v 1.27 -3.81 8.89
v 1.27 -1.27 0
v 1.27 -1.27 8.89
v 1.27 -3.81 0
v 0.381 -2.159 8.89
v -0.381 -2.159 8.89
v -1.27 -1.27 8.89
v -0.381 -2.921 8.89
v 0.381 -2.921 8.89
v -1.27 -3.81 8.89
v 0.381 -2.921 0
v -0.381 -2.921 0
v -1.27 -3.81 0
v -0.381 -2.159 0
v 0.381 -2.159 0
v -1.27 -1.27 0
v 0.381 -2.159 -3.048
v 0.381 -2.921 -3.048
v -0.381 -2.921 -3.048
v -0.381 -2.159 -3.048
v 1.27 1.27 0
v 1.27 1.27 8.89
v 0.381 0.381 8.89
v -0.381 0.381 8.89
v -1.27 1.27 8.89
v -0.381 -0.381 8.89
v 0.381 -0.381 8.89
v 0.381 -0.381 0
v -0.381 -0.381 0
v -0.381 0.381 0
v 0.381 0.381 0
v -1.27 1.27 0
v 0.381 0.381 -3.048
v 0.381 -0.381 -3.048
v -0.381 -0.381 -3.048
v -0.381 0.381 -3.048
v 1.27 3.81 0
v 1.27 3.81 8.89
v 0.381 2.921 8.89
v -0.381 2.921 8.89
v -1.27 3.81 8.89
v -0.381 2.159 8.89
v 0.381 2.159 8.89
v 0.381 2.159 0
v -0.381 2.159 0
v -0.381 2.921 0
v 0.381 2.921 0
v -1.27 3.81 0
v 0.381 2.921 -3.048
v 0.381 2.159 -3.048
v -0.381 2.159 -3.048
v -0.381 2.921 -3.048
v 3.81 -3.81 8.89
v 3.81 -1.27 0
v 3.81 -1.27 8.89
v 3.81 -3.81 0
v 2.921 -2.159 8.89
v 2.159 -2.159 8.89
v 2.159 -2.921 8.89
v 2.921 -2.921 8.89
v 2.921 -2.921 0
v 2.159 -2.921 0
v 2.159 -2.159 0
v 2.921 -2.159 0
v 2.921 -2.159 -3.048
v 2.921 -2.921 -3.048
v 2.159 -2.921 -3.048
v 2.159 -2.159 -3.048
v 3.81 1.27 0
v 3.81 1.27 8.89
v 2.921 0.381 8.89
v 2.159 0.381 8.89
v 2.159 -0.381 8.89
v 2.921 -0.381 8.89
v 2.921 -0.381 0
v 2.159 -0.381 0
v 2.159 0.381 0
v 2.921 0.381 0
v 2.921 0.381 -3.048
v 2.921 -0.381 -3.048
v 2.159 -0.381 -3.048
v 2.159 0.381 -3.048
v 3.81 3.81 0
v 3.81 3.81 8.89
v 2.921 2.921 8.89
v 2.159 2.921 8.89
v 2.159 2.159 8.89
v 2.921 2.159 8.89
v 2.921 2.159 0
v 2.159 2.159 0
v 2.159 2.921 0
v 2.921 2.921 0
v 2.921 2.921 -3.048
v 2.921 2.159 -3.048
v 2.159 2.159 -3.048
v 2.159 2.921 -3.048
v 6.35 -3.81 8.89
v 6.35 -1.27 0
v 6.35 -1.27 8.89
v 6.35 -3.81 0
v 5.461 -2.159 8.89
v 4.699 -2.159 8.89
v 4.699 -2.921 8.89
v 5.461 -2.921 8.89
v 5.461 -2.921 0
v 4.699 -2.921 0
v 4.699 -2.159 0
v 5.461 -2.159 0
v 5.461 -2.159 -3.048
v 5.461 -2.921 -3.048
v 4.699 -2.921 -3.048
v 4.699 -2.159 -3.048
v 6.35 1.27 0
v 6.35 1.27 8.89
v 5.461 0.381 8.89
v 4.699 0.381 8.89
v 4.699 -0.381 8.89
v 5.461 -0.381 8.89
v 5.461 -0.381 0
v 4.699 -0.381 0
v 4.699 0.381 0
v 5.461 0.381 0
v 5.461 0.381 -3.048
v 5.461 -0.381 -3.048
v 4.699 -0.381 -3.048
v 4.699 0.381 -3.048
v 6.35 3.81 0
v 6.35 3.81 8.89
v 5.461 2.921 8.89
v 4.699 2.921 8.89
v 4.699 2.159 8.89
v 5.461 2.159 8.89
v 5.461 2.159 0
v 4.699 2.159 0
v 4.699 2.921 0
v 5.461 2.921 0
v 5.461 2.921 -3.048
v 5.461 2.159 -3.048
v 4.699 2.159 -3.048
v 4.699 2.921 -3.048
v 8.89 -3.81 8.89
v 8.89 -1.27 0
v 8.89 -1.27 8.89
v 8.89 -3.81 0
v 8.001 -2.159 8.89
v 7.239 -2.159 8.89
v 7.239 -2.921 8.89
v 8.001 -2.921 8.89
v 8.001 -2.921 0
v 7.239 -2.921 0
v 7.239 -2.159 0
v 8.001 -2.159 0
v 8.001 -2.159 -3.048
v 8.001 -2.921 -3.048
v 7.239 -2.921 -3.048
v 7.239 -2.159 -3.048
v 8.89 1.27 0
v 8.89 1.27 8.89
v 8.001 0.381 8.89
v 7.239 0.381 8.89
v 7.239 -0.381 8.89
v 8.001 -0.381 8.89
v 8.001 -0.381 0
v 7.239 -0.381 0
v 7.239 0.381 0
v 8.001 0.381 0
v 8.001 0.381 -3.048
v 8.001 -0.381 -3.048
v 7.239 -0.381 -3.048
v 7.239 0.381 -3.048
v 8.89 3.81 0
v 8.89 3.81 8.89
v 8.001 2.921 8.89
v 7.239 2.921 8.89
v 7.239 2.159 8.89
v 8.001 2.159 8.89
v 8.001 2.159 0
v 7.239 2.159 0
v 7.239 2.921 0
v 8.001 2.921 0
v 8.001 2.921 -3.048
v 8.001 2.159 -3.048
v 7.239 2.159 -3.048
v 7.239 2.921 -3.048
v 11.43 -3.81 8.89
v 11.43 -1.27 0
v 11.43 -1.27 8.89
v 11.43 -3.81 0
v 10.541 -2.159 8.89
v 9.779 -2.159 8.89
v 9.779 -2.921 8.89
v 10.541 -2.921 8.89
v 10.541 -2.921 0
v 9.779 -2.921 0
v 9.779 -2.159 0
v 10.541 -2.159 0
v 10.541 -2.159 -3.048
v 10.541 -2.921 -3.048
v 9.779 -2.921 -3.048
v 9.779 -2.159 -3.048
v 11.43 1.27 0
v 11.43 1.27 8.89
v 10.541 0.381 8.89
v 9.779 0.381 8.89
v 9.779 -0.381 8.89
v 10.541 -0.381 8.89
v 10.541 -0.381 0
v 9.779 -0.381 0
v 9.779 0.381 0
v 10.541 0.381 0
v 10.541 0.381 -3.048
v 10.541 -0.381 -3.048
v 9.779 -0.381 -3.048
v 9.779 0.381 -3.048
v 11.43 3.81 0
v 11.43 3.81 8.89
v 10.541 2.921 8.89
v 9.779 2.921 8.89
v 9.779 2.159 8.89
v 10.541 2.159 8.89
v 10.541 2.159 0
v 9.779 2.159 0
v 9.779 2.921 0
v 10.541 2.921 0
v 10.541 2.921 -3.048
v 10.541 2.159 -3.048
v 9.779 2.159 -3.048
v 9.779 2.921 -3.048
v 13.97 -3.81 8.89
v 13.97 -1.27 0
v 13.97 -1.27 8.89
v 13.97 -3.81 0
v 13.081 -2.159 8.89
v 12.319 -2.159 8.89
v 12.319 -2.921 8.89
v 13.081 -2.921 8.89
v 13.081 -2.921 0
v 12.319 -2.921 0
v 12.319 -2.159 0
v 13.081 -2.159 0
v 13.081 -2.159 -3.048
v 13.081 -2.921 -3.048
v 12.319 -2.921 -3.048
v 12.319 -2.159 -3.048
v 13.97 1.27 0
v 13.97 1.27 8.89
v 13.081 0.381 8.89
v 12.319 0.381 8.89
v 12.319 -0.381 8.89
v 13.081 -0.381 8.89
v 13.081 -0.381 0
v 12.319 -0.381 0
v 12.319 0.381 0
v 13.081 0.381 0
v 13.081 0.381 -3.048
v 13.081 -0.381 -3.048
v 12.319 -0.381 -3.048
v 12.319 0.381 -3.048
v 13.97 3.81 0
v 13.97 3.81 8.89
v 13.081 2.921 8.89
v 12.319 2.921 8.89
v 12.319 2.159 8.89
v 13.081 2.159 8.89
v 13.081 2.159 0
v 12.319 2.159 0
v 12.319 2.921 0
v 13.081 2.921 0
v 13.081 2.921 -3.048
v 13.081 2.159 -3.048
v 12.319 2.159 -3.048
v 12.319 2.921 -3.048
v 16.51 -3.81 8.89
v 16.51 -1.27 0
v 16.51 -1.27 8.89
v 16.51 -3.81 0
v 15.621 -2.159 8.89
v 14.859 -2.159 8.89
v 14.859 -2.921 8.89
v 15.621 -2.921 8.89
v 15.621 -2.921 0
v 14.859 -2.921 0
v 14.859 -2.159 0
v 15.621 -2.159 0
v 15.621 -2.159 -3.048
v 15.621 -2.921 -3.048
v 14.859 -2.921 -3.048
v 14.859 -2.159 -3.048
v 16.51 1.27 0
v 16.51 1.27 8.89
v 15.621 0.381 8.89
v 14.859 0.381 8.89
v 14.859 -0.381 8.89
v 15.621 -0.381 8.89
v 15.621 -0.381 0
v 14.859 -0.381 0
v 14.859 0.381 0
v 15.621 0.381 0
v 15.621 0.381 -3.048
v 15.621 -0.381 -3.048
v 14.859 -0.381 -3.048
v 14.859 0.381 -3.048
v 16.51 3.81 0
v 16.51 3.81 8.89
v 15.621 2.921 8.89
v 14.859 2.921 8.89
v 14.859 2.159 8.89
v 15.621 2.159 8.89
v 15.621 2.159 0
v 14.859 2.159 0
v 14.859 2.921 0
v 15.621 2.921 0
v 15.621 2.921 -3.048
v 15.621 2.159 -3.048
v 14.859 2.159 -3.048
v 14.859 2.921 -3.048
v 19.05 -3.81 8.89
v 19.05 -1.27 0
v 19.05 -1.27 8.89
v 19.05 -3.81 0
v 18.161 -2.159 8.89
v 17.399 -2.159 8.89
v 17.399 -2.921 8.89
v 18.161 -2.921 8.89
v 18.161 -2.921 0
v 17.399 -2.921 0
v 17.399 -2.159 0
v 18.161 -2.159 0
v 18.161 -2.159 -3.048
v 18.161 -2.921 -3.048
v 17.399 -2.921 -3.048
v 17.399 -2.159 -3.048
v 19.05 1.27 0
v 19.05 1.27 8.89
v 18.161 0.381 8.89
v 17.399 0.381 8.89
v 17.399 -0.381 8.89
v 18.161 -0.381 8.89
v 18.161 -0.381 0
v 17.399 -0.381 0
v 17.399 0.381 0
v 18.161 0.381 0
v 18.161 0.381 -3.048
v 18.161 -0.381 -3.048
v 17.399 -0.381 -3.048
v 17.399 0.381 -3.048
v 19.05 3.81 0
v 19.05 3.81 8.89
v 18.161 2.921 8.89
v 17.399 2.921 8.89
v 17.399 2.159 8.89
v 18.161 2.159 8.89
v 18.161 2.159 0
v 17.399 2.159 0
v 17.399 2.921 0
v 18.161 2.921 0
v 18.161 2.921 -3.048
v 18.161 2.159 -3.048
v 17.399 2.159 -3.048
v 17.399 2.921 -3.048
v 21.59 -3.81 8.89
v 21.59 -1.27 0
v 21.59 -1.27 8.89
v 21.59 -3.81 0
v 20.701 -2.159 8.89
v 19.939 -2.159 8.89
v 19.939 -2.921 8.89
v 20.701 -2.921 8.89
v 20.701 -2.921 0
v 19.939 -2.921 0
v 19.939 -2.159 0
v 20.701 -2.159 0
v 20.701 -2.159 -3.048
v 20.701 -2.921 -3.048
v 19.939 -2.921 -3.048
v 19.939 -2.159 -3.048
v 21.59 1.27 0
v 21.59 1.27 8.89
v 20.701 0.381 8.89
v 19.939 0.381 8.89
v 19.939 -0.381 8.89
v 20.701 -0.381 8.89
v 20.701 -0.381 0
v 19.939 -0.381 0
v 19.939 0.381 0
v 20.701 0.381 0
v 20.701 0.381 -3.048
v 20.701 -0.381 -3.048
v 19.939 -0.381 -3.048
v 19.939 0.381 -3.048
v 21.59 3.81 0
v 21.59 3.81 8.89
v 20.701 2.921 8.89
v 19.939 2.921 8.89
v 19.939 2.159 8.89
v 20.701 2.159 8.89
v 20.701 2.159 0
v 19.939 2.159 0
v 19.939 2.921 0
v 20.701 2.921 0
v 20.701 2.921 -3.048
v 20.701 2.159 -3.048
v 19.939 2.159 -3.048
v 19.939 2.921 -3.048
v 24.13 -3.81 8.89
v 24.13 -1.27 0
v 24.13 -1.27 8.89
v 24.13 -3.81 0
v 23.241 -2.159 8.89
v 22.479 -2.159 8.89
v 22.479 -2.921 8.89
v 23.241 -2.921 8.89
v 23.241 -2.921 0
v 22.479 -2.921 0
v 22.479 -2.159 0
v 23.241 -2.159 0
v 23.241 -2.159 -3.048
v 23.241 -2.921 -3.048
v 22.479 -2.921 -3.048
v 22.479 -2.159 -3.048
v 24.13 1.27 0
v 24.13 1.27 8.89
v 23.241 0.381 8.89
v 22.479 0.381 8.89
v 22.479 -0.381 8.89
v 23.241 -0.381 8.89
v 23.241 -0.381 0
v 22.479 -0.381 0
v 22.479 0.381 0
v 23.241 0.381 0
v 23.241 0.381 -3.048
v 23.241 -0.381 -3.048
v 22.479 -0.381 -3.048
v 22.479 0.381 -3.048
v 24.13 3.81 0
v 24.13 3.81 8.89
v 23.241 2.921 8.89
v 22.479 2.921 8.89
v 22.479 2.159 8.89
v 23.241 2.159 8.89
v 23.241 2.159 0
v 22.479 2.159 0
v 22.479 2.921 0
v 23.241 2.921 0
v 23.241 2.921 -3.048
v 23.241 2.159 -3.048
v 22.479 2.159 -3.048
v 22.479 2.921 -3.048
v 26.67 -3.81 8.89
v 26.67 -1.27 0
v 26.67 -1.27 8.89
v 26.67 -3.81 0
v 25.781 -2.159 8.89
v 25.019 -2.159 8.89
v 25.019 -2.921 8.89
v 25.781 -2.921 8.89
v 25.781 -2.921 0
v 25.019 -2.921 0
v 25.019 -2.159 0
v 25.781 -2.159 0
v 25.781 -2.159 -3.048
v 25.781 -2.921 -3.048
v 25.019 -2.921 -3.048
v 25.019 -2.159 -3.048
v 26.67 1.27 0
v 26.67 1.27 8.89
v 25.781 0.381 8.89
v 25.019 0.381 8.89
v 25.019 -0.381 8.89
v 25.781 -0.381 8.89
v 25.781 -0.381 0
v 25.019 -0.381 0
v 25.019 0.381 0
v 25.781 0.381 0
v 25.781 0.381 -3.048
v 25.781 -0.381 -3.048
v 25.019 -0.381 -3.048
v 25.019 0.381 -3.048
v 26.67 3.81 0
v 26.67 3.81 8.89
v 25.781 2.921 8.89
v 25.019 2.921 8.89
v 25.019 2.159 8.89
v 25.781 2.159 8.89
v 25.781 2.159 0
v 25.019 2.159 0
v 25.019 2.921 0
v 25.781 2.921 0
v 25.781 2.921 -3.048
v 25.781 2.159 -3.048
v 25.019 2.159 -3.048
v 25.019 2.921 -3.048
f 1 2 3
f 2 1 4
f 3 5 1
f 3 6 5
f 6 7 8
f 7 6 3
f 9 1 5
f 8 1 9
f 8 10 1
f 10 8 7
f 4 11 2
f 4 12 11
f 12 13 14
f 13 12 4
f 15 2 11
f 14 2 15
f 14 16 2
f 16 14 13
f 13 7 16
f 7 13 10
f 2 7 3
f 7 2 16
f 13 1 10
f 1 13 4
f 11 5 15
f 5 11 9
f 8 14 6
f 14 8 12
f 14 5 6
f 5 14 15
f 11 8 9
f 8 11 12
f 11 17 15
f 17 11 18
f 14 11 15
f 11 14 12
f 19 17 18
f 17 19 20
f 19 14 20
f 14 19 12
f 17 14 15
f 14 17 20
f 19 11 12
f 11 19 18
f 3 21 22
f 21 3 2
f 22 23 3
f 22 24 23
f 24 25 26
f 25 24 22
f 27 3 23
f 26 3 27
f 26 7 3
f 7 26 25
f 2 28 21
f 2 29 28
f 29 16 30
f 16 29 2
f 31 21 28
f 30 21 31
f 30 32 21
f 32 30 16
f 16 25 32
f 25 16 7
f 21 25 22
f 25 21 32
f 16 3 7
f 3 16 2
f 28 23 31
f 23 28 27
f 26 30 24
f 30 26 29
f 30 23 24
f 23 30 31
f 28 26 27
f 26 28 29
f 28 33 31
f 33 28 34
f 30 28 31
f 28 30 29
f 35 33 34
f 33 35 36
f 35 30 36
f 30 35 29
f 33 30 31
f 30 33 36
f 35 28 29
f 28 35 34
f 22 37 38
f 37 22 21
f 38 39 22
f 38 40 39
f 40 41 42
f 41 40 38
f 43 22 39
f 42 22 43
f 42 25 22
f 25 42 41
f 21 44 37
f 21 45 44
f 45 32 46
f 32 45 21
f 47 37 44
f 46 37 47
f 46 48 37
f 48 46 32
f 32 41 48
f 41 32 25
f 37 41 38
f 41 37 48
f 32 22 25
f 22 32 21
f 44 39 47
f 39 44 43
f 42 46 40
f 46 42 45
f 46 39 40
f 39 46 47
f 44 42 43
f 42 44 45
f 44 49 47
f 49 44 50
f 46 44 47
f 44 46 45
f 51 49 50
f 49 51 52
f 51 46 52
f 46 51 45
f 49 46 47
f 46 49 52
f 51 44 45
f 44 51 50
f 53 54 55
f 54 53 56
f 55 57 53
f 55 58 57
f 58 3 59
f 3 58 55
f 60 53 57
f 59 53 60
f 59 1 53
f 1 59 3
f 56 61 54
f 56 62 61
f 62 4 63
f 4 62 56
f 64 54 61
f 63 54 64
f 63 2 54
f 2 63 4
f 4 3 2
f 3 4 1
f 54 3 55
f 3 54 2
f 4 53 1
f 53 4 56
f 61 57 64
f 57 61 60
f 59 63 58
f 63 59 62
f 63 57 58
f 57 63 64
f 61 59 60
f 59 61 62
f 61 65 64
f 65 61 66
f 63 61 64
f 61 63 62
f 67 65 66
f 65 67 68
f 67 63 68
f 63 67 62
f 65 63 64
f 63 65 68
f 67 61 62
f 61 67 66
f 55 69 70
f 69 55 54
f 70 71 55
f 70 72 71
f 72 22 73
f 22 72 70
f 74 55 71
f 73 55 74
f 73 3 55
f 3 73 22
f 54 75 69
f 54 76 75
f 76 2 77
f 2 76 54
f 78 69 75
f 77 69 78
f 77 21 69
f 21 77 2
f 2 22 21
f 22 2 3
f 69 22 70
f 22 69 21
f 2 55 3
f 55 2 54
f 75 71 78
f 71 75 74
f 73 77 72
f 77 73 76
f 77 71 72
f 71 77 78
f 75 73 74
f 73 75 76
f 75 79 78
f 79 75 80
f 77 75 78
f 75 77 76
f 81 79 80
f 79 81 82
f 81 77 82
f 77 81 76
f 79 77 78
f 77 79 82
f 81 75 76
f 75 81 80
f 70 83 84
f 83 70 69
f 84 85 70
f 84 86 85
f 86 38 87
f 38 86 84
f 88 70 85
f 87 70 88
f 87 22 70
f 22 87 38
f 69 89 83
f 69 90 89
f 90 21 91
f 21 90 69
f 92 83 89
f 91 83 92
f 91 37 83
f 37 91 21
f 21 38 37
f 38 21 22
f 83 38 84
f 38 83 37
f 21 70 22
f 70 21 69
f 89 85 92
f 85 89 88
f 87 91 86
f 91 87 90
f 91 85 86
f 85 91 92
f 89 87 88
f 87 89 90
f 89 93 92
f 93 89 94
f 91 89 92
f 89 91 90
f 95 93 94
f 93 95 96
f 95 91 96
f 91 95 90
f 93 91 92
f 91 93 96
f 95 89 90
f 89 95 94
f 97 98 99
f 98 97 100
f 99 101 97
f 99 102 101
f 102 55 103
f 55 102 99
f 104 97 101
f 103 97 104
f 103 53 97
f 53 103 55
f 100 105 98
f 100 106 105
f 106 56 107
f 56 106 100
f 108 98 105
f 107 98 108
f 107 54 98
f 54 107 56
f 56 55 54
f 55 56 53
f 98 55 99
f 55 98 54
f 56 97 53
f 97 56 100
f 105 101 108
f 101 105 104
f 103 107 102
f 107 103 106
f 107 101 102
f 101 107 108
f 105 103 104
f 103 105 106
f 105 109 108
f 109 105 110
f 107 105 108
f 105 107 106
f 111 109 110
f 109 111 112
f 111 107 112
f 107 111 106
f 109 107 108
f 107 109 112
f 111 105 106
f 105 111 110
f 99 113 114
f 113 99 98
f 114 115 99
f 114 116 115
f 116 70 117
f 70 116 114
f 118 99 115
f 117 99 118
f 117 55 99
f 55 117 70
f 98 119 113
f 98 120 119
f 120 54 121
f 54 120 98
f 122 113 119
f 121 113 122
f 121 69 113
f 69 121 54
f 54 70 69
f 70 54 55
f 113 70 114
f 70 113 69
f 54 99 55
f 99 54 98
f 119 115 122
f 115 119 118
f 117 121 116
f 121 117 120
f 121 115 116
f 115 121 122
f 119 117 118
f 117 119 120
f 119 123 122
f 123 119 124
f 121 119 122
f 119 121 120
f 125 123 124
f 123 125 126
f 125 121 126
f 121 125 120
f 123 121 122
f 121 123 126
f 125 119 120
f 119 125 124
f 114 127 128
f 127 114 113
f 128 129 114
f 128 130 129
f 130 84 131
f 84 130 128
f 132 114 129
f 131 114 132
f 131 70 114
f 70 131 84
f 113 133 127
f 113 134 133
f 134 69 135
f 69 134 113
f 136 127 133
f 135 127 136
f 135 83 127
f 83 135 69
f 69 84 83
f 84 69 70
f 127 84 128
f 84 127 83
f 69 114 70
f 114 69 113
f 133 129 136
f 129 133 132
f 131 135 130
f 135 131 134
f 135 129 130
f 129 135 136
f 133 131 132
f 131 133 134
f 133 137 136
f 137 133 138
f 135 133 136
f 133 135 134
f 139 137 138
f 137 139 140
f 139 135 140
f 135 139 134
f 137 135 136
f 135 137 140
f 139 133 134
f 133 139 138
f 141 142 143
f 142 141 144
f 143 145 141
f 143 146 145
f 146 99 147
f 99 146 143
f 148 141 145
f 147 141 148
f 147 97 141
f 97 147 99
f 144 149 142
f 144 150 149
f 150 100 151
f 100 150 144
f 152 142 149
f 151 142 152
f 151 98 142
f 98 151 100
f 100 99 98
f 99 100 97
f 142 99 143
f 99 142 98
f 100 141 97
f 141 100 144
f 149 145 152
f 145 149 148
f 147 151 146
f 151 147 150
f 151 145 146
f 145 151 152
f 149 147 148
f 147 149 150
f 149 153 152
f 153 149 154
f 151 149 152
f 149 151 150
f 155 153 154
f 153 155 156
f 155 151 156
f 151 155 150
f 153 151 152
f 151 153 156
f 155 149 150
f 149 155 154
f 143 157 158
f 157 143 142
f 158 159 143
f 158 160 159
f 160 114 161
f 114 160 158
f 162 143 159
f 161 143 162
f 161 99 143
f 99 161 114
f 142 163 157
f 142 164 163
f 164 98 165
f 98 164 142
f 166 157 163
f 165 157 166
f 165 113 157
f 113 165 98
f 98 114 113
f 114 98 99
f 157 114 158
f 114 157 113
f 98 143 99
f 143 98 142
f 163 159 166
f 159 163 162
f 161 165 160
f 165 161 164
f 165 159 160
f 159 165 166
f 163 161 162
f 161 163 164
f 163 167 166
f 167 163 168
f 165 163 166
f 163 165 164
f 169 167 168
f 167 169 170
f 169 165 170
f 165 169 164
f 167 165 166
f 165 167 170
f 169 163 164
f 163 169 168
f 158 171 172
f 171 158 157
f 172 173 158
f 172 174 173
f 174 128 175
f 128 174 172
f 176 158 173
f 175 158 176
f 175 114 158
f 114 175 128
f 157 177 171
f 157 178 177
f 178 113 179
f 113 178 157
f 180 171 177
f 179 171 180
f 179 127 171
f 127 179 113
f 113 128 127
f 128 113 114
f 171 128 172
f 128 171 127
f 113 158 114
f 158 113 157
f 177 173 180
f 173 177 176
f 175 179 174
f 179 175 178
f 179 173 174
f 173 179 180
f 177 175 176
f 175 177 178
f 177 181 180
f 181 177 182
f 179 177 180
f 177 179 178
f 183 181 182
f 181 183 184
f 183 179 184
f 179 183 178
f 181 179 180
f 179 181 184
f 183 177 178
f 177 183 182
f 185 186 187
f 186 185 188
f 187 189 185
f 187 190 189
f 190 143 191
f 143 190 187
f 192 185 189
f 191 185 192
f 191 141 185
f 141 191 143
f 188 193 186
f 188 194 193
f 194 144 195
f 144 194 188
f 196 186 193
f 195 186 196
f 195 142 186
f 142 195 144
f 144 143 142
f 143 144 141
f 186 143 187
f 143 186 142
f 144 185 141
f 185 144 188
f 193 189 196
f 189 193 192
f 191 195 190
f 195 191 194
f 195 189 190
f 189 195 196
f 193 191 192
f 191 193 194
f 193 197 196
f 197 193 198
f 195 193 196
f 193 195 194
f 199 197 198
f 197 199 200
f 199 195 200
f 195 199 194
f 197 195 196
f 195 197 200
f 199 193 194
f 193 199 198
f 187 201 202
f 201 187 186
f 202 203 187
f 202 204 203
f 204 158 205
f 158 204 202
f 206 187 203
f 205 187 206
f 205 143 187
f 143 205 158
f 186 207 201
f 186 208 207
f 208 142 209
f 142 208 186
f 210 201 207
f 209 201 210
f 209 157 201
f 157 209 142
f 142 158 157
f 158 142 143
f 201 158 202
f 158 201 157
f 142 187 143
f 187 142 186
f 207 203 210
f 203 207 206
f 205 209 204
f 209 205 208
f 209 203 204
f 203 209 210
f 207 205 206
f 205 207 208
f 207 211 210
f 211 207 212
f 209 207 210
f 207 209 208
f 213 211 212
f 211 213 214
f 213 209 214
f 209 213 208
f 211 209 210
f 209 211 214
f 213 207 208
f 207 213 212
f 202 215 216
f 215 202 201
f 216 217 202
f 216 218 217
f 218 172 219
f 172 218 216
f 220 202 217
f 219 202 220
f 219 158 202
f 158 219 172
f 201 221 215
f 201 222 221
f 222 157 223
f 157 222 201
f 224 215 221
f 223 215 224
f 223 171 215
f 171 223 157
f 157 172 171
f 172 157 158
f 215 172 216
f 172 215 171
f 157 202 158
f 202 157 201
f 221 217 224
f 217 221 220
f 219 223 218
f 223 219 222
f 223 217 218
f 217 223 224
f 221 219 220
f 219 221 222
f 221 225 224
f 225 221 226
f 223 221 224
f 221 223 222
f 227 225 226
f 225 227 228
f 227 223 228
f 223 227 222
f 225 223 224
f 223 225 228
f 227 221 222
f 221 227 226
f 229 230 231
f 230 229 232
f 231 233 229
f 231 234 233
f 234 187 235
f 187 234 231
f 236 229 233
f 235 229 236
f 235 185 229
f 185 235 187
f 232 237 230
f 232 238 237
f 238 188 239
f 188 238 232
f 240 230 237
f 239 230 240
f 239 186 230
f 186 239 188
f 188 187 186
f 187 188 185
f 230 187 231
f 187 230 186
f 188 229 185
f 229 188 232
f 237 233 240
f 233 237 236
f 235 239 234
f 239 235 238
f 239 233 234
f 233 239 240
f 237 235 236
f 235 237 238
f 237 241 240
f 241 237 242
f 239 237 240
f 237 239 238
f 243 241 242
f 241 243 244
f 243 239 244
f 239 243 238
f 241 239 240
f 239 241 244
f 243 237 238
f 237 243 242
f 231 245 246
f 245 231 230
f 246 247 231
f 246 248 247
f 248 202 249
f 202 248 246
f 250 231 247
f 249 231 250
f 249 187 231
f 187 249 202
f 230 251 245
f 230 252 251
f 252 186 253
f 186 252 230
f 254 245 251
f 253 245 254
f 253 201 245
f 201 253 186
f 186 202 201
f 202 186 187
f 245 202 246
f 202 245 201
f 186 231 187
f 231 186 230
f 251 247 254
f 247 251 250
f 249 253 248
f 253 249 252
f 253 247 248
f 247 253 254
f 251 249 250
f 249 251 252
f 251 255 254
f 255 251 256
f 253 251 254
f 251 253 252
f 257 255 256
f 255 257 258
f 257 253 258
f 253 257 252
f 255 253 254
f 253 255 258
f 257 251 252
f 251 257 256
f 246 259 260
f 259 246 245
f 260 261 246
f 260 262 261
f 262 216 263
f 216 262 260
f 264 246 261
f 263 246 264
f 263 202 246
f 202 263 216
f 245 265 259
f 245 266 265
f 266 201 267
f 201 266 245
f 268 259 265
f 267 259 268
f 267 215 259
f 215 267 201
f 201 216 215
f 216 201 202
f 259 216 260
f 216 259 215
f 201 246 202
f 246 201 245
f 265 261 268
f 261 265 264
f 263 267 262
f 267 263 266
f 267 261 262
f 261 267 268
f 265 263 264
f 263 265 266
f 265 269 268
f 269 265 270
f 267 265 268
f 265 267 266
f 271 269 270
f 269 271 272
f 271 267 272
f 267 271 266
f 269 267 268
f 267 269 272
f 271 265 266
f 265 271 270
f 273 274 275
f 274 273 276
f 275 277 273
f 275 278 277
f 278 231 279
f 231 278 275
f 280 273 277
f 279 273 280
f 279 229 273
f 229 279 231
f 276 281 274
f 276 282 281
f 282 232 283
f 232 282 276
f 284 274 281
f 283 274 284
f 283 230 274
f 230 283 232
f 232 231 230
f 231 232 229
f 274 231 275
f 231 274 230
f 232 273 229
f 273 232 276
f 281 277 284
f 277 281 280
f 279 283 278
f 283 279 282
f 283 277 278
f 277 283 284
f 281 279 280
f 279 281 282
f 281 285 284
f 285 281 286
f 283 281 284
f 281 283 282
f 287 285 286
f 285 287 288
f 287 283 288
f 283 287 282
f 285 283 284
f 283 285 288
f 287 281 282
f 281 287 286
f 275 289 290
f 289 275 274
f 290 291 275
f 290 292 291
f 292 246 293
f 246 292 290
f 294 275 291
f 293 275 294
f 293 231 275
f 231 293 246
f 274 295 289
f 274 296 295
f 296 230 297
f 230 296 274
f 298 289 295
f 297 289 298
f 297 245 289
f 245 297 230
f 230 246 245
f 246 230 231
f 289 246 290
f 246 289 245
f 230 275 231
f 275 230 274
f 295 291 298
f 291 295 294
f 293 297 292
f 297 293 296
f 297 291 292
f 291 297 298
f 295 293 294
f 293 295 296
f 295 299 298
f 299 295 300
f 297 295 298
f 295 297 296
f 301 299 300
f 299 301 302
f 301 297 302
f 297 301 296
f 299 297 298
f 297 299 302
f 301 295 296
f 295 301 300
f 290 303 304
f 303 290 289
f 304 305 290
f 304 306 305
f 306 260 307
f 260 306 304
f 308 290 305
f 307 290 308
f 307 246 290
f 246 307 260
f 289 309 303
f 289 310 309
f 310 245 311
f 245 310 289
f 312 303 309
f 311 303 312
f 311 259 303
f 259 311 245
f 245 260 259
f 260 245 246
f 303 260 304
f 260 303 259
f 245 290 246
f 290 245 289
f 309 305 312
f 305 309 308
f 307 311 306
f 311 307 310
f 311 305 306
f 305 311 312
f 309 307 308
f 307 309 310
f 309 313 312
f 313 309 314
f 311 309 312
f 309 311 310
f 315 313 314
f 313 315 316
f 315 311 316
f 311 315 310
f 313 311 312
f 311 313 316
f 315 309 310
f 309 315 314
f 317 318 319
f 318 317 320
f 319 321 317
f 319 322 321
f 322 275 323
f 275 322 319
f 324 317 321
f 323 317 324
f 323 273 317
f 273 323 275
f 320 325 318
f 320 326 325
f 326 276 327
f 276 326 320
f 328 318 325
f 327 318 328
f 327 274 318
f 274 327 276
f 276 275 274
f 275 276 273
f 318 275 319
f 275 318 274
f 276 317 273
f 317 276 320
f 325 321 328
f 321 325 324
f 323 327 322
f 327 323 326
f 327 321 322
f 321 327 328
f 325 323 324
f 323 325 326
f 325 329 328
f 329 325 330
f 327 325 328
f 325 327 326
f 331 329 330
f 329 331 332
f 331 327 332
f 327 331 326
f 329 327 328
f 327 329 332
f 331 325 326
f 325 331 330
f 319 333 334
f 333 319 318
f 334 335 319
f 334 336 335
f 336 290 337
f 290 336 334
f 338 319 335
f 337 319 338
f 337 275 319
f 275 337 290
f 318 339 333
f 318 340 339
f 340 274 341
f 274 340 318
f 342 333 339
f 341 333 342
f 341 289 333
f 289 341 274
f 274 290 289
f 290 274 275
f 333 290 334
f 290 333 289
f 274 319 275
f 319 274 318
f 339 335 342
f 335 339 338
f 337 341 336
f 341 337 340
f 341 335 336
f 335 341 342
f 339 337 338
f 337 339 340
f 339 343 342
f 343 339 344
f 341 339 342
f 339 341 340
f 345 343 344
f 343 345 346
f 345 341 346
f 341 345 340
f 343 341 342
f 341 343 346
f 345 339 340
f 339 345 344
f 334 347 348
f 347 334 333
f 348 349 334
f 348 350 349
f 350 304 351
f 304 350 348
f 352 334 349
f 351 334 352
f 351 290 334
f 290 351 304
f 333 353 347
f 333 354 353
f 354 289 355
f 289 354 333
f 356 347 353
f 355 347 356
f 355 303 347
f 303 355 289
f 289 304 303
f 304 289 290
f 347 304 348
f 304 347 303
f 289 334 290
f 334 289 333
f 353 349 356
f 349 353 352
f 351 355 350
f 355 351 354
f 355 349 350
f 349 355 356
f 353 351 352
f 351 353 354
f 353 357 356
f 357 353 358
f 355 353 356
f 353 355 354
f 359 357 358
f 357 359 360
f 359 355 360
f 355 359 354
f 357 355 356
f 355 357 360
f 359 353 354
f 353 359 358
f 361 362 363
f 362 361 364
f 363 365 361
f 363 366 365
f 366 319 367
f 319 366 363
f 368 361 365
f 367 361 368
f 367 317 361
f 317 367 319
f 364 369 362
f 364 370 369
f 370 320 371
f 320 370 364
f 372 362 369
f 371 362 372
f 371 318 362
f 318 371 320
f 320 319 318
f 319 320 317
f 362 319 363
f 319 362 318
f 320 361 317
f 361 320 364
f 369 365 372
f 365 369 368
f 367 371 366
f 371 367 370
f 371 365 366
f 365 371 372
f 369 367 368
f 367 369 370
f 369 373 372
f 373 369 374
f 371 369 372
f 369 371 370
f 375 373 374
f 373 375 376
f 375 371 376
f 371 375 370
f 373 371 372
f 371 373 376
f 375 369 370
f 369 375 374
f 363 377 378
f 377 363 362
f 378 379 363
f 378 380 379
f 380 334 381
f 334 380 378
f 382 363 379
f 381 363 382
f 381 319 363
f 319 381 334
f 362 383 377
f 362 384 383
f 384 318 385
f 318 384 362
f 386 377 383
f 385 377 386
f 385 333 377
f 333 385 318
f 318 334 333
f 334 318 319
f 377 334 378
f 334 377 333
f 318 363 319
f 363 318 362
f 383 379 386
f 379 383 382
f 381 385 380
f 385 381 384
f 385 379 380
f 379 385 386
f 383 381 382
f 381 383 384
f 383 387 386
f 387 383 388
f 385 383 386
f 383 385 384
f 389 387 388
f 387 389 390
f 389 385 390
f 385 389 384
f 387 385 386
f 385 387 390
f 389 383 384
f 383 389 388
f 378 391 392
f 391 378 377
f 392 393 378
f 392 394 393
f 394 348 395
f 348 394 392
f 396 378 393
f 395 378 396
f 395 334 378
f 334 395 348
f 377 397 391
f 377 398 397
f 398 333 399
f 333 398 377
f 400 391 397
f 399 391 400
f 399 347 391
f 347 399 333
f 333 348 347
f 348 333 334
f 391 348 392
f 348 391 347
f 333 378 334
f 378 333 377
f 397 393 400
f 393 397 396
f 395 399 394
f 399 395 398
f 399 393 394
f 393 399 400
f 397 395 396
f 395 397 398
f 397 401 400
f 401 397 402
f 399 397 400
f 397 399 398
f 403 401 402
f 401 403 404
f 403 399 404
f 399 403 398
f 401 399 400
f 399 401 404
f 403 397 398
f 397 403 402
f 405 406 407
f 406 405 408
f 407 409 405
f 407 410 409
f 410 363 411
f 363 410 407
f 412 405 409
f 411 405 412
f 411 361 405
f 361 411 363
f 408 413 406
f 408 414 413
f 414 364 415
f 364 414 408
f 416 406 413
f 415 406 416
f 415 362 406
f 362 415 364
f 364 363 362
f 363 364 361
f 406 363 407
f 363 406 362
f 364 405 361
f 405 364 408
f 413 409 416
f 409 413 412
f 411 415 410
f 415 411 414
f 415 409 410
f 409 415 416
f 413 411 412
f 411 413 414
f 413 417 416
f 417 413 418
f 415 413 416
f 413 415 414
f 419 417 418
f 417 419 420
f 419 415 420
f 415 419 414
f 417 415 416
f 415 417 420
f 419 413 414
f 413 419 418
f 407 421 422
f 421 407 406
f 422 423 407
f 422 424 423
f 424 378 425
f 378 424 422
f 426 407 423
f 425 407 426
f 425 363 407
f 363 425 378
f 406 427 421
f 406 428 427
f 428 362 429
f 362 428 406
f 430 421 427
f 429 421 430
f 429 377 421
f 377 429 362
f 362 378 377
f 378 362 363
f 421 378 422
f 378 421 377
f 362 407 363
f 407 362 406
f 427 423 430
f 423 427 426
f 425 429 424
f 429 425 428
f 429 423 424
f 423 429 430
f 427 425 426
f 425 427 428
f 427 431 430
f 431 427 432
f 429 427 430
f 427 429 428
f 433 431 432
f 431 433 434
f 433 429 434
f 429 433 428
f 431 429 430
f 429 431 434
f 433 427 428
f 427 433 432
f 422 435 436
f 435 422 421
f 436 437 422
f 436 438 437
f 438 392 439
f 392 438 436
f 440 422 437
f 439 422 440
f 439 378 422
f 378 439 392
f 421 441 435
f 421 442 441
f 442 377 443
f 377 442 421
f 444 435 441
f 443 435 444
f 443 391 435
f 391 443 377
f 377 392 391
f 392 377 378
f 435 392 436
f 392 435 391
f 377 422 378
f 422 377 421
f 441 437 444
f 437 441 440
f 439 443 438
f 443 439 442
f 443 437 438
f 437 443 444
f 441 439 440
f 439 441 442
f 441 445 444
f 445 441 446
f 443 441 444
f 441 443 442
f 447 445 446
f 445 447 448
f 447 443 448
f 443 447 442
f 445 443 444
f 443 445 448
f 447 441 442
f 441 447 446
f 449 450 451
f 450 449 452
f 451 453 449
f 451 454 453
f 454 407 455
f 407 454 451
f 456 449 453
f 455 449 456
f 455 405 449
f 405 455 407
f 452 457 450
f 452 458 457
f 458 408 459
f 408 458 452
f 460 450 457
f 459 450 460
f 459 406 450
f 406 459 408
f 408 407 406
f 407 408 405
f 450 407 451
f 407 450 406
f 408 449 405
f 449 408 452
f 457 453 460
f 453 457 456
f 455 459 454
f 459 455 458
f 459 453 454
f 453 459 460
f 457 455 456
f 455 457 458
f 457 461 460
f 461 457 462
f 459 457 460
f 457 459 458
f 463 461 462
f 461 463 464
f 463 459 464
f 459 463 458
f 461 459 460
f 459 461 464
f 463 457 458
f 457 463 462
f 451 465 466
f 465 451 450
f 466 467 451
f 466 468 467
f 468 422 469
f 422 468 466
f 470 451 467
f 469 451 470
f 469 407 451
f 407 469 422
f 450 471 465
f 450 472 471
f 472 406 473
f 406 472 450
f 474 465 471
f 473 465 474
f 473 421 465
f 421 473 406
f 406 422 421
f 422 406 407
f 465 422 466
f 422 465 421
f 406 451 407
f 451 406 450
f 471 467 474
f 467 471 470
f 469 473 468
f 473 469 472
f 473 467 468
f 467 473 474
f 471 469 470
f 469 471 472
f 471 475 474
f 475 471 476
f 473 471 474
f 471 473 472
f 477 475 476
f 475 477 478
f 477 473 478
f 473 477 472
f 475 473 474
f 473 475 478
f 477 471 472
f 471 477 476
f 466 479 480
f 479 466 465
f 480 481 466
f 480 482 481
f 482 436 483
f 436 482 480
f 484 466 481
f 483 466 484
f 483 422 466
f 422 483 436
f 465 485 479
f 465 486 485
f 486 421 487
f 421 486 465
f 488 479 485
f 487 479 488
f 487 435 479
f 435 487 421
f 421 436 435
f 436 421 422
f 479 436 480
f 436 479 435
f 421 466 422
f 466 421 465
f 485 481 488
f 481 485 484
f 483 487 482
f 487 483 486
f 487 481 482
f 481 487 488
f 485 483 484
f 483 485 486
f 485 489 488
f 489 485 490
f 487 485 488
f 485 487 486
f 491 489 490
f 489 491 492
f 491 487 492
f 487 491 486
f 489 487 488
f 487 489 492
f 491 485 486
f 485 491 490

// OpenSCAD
module pinF(){
    millis= 0.0254;
    pin=    30*millis;
    pinH=   450*millis;
    space=  100*millis;
    cut=    10*millis;
    mXY=[   [0,0,0], 
            [0,1,0],
            [1,0,0],
            [1,1,0]]; //mirror XY
    
    color("gold")
    translate ([-pin/2,-pin/2,-120*millis]) cube([pin,pin,120*millis]);    
    color("gray") 
    difference(){
        translate(-[space,space]/2) cube([space,space,pinH-space]);
//        for (i=mXY) mirror(i) translate([space,space]/2)cylinder(pinH,cut,cut,$fn=8);
        translate ([-pin/2,-pin/2,0]) cube([pin,pin,pinH]);    
    }
}
for (x=[0:1:10], y=[-1:1:+1]) translate([x*2.54,y*2.54,0]) pinF();
